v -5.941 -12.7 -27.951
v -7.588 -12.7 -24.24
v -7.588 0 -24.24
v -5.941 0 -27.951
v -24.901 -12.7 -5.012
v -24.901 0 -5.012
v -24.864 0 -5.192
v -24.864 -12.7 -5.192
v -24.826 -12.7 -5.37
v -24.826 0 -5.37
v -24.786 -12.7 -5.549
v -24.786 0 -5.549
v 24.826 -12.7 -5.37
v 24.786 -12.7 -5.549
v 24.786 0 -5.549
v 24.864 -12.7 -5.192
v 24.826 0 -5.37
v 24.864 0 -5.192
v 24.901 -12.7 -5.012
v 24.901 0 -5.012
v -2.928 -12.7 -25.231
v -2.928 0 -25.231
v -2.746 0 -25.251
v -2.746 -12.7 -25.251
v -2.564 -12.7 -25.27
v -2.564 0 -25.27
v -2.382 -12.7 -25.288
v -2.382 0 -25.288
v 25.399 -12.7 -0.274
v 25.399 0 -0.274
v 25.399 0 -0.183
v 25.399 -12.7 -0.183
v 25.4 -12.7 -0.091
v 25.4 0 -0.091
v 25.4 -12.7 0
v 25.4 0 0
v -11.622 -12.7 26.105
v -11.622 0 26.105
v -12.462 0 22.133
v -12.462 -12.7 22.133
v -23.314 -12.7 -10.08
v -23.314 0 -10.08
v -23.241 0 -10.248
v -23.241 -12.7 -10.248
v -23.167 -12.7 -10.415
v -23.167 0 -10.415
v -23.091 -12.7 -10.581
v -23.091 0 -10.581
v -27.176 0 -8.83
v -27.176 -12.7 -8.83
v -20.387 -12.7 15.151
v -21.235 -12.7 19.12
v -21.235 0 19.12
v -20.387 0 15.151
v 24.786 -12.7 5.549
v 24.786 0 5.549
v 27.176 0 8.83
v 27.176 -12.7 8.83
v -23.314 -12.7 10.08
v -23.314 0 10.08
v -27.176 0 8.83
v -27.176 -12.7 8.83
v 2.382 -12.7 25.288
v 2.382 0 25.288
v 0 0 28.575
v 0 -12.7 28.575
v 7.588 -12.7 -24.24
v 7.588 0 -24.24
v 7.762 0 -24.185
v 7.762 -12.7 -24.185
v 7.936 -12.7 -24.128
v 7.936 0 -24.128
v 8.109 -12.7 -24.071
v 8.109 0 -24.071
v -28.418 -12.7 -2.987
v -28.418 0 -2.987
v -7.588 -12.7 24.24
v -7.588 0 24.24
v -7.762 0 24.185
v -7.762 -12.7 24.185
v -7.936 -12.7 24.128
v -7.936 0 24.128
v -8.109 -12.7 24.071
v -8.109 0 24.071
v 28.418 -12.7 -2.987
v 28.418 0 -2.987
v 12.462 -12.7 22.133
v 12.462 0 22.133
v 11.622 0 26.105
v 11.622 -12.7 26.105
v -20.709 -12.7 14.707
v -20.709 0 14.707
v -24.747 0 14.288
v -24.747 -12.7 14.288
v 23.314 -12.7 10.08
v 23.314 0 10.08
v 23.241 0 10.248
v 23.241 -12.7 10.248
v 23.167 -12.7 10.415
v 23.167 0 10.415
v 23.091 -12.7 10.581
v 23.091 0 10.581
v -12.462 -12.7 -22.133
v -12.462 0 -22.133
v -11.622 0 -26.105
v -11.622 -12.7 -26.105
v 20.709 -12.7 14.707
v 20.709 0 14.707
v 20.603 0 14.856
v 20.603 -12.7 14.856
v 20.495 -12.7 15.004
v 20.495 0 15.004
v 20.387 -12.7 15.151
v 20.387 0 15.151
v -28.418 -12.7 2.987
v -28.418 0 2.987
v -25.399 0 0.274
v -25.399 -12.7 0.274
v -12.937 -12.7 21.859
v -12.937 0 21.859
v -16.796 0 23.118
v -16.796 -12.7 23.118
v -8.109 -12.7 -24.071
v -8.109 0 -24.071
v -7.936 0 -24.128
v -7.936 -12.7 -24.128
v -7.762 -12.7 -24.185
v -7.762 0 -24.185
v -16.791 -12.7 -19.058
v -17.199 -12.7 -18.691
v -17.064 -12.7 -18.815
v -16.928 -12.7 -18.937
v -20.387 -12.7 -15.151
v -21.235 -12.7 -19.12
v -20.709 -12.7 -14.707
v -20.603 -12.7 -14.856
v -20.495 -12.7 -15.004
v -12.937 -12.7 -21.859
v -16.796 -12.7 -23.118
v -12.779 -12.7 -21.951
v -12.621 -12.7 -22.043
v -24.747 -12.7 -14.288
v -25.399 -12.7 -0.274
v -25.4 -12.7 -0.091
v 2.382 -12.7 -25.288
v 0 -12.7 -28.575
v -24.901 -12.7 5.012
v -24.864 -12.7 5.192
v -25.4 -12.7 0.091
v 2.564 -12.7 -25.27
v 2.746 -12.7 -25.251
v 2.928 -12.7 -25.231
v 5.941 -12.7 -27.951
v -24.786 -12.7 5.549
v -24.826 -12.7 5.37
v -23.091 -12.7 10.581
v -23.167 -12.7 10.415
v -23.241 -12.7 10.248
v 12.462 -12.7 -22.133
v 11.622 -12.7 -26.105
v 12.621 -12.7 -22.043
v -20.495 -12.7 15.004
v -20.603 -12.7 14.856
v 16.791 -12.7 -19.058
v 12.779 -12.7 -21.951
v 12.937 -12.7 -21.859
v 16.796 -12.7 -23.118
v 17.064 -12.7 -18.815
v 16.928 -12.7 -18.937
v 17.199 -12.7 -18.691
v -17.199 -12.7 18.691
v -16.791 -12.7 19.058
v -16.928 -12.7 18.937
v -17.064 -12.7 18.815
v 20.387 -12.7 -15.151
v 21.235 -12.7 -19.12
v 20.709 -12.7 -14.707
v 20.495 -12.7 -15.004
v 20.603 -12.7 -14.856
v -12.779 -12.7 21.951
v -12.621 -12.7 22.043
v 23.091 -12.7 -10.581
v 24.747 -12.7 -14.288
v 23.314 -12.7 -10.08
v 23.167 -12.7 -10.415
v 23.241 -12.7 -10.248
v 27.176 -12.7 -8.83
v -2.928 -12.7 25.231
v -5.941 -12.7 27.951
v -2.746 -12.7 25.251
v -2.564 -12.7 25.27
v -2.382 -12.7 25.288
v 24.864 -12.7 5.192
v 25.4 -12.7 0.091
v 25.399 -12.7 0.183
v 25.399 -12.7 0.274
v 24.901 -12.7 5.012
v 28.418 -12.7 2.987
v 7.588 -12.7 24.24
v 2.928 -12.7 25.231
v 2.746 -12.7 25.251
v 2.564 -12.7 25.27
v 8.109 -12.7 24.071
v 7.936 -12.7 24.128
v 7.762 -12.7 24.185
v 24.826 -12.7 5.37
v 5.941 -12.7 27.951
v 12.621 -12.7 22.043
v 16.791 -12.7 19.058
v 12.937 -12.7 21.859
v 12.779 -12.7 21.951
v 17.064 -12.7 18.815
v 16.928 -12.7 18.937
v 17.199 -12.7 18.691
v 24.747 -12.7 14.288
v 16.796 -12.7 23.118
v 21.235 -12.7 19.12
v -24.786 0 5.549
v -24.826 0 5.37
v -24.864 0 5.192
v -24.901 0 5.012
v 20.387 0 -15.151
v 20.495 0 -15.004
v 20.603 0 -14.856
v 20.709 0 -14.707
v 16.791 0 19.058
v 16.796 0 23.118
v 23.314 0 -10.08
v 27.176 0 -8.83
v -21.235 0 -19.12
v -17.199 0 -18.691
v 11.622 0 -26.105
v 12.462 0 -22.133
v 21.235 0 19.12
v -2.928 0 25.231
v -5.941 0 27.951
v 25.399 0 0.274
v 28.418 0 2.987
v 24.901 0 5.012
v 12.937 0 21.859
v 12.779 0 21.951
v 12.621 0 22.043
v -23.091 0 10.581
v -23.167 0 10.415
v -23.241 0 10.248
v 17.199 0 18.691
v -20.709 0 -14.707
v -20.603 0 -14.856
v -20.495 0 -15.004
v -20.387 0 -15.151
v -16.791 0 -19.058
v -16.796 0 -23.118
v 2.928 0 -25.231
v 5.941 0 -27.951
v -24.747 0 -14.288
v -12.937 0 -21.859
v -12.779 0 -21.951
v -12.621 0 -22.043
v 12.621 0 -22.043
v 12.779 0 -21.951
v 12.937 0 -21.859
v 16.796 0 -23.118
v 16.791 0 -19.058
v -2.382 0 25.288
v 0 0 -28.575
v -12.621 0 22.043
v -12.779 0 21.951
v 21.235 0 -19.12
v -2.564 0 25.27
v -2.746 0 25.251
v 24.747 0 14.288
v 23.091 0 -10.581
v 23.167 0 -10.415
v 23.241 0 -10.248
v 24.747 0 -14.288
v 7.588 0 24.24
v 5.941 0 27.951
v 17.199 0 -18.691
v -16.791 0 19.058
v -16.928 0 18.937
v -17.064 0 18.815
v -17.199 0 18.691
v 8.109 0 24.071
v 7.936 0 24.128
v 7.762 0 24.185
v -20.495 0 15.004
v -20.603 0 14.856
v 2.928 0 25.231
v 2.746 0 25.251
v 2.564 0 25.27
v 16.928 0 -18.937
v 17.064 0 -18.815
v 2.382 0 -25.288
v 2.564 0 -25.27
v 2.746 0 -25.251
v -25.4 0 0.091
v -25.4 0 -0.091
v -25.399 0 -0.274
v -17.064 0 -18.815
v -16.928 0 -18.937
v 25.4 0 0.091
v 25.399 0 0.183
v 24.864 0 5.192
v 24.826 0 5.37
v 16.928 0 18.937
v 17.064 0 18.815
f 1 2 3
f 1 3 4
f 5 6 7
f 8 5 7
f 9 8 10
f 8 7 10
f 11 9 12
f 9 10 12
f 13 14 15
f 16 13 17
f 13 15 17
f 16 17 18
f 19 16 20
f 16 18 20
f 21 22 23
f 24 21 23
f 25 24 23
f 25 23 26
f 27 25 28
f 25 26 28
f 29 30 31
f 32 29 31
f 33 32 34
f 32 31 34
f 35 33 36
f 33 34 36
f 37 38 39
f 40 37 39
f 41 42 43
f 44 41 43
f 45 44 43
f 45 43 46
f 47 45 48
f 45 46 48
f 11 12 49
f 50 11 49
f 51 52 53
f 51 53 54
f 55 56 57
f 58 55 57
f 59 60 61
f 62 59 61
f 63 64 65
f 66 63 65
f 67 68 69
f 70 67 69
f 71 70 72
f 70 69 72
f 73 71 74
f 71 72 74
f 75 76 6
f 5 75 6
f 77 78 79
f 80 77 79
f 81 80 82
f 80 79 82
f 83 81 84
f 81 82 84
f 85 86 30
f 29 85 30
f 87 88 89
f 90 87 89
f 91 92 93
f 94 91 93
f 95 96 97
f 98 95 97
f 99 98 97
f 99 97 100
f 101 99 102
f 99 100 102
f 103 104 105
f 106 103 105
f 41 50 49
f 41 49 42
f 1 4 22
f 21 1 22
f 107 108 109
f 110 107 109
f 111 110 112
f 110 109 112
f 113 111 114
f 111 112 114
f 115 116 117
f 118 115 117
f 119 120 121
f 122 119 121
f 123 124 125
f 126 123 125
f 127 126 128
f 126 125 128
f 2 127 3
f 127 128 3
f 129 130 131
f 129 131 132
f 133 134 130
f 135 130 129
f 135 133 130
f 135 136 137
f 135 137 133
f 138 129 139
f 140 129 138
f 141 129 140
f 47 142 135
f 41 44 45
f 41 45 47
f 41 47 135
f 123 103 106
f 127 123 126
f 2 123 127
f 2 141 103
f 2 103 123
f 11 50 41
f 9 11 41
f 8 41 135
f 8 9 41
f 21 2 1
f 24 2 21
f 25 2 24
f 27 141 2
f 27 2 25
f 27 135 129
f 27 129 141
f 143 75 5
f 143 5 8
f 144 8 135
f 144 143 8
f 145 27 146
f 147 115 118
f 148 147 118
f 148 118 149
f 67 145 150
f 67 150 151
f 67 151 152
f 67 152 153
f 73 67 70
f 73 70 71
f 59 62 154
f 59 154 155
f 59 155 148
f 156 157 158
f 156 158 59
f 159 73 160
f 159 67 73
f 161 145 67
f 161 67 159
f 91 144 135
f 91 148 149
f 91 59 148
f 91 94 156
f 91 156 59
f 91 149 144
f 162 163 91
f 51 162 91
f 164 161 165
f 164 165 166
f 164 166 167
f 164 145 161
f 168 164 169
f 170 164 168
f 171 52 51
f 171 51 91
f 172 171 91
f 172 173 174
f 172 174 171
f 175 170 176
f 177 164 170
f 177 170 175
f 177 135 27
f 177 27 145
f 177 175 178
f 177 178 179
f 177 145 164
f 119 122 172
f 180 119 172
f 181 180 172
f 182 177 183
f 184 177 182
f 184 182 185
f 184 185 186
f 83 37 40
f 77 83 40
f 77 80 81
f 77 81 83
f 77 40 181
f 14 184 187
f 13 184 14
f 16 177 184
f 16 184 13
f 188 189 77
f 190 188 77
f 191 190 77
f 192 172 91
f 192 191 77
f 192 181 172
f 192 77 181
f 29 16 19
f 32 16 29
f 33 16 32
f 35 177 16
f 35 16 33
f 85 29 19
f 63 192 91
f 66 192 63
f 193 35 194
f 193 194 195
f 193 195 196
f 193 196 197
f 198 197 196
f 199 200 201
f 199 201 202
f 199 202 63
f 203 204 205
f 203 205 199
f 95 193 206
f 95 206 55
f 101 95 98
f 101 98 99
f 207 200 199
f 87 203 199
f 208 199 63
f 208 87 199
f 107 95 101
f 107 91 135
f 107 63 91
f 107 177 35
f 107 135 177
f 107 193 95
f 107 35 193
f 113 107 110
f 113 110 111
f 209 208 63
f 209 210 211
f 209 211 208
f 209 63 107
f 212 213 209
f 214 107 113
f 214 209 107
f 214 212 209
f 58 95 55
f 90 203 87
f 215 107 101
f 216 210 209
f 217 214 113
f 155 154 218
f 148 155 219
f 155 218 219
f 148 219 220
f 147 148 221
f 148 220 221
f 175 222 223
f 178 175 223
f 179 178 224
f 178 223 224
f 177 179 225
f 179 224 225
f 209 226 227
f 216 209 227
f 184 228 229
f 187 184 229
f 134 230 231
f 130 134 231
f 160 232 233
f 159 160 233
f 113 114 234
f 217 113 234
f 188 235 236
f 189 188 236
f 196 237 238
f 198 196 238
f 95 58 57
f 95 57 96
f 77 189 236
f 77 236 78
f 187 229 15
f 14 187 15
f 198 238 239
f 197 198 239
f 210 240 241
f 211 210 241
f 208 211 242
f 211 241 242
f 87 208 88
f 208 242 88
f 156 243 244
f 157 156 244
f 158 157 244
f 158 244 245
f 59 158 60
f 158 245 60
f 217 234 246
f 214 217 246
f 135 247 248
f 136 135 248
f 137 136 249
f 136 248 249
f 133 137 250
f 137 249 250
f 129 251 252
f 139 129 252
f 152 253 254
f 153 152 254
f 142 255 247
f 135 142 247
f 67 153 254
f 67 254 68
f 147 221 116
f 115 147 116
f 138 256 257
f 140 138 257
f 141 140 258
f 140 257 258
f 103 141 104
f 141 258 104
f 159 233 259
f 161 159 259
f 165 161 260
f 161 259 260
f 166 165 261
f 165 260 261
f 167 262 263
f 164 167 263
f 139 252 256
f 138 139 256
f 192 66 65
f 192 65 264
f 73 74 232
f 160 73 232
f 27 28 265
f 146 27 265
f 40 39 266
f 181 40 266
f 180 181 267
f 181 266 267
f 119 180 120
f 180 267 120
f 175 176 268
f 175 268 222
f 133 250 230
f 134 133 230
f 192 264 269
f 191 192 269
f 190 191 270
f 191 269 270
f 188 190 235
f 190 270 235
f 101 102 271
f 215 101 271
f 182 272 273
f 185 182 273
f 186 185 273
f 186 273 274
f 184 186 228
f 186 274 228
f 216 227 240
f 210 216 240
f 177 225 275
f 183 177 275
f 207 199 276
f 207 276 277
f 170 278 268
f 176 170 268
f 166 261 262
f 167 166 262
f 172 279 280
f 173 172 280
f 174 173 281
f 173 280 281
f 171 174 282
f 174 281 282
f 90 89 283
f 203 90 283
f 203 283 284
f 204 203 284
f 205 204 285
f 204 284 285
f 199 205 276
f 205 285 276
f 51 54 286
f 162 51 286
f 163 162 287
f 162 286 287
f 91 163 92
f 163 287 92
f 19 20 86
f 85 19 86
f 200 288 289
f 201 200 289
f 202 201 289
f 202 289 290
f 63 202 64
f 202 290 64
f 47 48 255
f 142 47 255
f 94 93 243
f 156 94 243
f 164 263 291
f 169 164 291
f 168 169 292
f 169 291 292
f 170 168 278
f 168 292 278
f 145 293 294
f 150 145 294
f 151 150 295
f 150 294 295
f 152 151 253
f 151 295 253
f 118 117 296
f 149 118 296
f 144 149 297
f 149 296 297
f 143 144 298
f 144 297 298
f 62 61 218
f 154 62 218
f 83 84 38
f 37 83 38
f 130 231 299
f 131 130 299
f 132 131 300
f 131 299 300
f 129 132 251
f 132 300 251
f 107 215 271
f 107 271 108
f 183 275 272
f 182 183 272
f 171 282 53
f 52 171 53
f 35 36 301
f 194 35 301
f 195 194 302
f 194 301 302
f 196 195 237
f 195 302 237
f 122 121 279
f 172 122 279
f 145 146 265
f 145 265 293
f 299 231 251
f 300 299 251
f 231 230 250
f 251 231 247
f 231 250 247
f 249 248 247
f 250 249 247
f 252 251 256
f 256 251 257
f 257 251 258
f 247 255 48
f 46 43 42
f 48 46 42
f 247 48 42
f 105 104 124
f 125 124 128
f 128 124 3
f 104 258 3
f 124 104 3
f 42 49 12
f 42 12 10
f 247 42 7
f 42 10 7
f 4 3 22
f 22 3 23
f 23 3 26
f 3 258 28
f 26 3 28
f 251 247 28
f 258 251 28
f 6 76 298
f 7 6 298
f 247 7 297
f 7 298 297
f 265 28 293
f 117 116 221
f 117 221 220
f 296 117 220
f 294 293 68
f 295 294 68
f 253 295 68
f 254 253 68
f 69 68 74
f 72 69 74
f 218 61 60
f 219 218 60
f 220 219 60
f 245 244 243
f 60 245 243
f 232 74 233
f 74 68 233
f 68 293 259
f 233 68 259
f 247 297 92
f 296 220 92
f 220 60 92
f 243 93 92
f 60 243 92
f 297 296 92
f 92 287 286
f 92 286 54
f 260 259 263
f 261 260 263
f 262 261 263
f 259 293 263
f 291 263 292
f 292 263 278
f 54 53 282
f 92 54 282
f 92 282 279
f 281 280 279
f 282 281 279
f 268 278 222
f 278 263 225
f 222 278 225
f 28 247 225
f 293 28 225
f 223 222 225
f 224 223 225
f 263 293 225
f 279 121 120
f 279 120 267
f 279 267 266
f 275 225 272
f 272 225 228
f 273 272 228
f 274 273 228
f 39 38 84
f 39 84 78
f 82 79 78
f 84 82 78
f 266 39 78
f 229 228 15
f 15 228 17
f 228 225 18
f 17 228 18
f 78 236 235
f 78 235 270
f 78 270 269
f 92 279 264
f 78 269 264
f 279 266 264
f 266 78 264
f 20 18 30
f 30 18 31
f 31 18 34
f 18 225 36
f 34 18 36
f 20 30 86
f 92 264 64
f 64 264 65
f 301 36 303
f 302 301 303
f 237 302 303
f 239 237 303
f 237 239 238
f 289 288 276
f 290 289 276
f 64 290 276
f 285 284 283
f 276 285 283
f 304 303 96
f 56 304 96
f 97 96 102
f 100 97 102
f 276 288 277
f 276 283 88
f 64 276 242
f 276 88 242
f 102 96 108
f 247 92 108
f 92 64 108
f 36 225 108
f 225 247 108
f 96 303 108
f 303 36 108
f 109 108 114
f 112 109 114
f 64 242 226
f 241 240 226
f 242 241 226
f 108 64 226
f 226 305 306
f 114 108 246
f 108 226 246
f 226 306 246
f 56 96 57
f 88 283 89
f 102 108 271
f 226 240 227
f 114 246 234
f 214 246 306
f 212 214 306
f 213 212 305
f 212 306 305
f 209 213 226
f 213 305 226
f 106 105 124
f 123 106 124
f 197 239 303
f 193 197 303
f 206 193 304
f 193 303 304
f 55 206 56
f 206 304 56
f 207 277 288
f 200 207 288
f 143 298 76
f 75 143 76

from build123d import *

# Parameters (mm, degrees)
F1_DEPTH = 12.7


with BuildPart() as f1:
    # F0 (on Front) → F1 (new body)
    with BuildSketch(Plane.XZ):
        with BuildLine():
            ThreePointArc((25.39852, -0.274206), (25.39963, -0.137105), (25.4, 0))
            ThreePointArc((25.4, 0), (25.39963, 0.137105), (25.39852, 0.274206))
            ThreePointArc((25.39852, 0.274206), (25.260856, 2.655023), (24.900512, 5.012436))
            ThreePointArc((24.900512, 5.012436), (24.844949, 5.280957), (24.786491, 5.548863))
            ThreePointArc((24.786491, 5.548863), (24.156836, 7.849032), (23.314232, 10.080009))
            ThreePointArc((23.314232, 10.080009), (23.204055, 10.331111), (23.091173, 10.581008))
            ThreePointArc((23.091173, 10.581008), (21.997045, 12.7), (20.709008, 14.707038))
            ThreePointArc((20.709008, 14.707038), (20.549032, 14.929745), (20.38666, 15.150713))
            ThreePointArc((20.38666, 15.150713), (18.875879, 16.995917), (17.198702, 18.691299))
            ThreePointArc((17.198702, 18.691299), (16.995917, 18.875879), (16.791152, 19.058258))
            ThreePointArc((16.791152, 19.058258), (14.929745, 20.549032), (12.936729, 21.858661))
            ThreePointArc((12.936729, 21.858661), (12.7, 21.997045), (12.461791, 22.132866))
            ThreePointArc((12.461791, 22.132866), (10.331111, 23.204055), (8.109359, 24.070694))
            ThreePointArc((8.109359, 24.070694), (7.849032, 24.156836), (7.587789, 24.240162))
            ThreePointArc((7.587789, 24.240162), (5.280957, 24.844949), (2.927572, 25.230722))
            ThreePointArc((2.927572, 25.230722), (2.655023, 25.260856), (2.382165, 25.288046))
            ThreePointArc((2.382165, 25.288046), (0, 25.4), (-2.382165, 25.288046))
            ThreePointArc((-2.382165, 25.288046), (-2.655023, 25.260856), (-2.927572, 25.230722))
            ThreePointArc((-2.927572, 25.230722), (-5.280957, 24.844949), (-7.587789, 24.240162))
            ThreePointArc((-7.587789, 24.240162), (-7.849032, 24.156836), (-8.109359, 24.070694))
            ThreePointArc((-8.109359, 24.070694), (-10.331111, 23.204055), (-12.461791, 22.132866))
            ThreePointArc((-12.461791, 22.132866), (-12.7, 21.997045), (-12.936729, 21.858661))
            ThreePointArc((-12.936729, 21.858661), (-14.929745, 20.549032), (-16.791152, 19.058258))
            ThreePointArc((-16.791152, 19.058258), (-16.995917, 18.875879), (-17.198702, 18.691299))
            ThreePointArc((-17.198702, 18.691299), (-18.875879, 16.995917), (-20.38666, 15.150713))
            ThreePointArc((-20.38666, 15.150713), (-20.549032, 14.929745), (-20.709008, 14.707038))
            ThreePointArc((-20.709008, 14.707038), (-21.997045, 12.7), (-23.091173, 10.581008))
            ThreePointArc((-23.091173, 10.581008), (-23.204055, 10.331111), (-23.314232, 10.080009))
            ThreePointArc((-23.314232, 10.080009), (-24.156836, 7.849032), (-24.786491, 5.548863))
            ThreePointArc((-24.786491, 5.548863), (-24.844949, 5.280957), (-24.900512, 5.012436))
            ThreePointArc((-24.900512, 5.012436), (-25.260856, 2.655023), (-25.39852, 0.274206))
            ThreePointArc((-25.39852, 0.274206), (-25.4, 0), (-25.39852, -0.274206))
            ThreePointArc((-25.39852, -0.274206), (-25.260856, -2.655023), (-24.900512, -5.012436))
            ThreePointArc((-24.900512, -5.012436), (-24.844949, -5.280957), (-24.786491, -5.548863))
            ThreePointArc((-24.786491, -5.548863), (-24.156836, -7.849032), (-23.314232, -10.080009))
            ThreePointArc((-23.314232, -10.080009), (-23.204055, -10.331111), (-23.091173, -10.581008))
            ThreePointArc((-23.091173, -10.581008), (-21.997045, -12.7), (-20.709008, -14.707038))
            ThreePointArc((-20.709008, -14.707038), (-20.549032, -14.929745), (-20.38666, -15.150713))
            ThreePointArc((-20.38666, -15.150713), (-18.875879, -16.995917), (-17.198702, -18.691299))
            ThreePointArc((-17.198702, -18.691299), (-16.995917, -18.875879), (-16.791152, -19.058258))
            ThreePointArc((-16.791152, -19.058258), (-14.929745, -20.549032), (-12.936729, -21.858661))
            ThreePointArc((-12.936729, -21.858661), (-12.7, -21.997045), (-12.461791, -22.132866))
            ThreePointArc((-12.461791, -22.132866), (-10.331111, -23.204055), (-8.109359, -24.070694))
            ThreePointArc((-8.109359, -24.070694), (-7.849032, -24.156836), (-7.587789, -24.240162))
            ThreePointArc((-7.587789, -24.240162), (-5.280957, -24.844949), (-2.927572, -25.230722))
            ThreePointArc((-2.927572, -25.230722), (-2.655023, -25.260856), (-2.382165, -25.288046))
            ThreePointArc((-2.382165, -25.288046), (0, -25.4), (2.382165, -25.288046))
            ThreePointArc((2.382165, -25.288046), (2.655023, -25.260856), (2.927572, -25.230722))
            ThreePointArc((2.927572, -25.230722), (5.280957, -24.844949), (7.587789, -24.240162))
            ThreePointArc((7.587789, -24.240162), (7.849032, -24.156836), (8.109359, -24.070694))
            ThreePointArc((8.109359, -24.070694), (10.331111, -23.204055), (12.461791, -22.132866))
            ThreePointArc((12.461791, -22.132866), (12.7, -21.997045), (12.936729, -21.858661))
            ThreePointArc((12.936729, -21.858661), (14.929745, -20.549032), (16.791152, -19.058258))
            ThreePointArc((16.791152, -19.058258), (16.995917, -18.875879), (17.198702, -18.691299))
            ThreePointArc((17.198702, -18.691299), (18.875879, -16.995917), (20.38666, -15.150713))
            ThreePointArc((20.38666, -15.150713), (20.549032, -14.929745), (20.709008, -14.707038))
            ThreePointArc((20.709008, -14.707038), (21.997045, -12.7), (23.091173, -10.581008))
            ThreePointArc((23.091173, -10.581008), (23.204055, -10.331111), (23.314232, -10.080009))
            ThreePointArc((23.314232, -10.080009), (24.156836, -7.849032), (24.786491, -5.548863))
            ThreePointArc((24.786491, -5.548863), (24.844949, -5.280957), (24.900512, -5.012436))
            ThreePointArc((24.900512, -5.012436), (25.260856, -2.655023), (25.39852, -0.274206))
        make_face()
        with BuildLine():
            ThreePointArc((-23.091173, 10.581008), (-21.997045, 12.7), (-20.709008, 14.707038))
            Line((-20.709008, 14.707038), (-24.746676, 14.2875))
            Line((-24.746676, 14.2875), (-23.091173, 10.581008))
        make_face()
        with BuildLine():
            ThreePointArc((-20.38666, 15.150713), (-18.875879, 16.995917), (-17.198702, 18.691299))
            Line((-17.198702, 18.691299), (-21.235363, 19.120407))
            Line((-21.235363, 19.120407), (-20.38666, 15.150713))
        make_face()
        with BuildLine():
            ThreePointArc((-16.791152, 19.058258), (-14.929745, 20.549032), (-12.936729, 21.858661))
            Line((-12.936729, 21.858661), (-16.795964, 23.117661))
            Line((-16.795964, 23.117661), (-16.791152, 19.058258))
        make_face()
        with BuildLine():
            ThreePointArc((-12.461791, 22.132866), (-10.331111, 23.204055), (-8.109359, 24.070694))
            Line((-8.109359, 24.070694), (-11.6225, 26.104561))
            Line((-11.6225, 26.104561), (-12.461791, 22.132866))
        make_face()
        with BuildLine():
            ThreePointArc((-7.587789, 24.240162), (-5.280957, 24.844949), (-2.927572, 25.230722))
            Line((-2.927572, 25.230722), (-5.941077, 27.950568))
            Line((-5.941077, 27.950568), (-7.587789, 24.240162))
        make_face()
        with BuildLine():
            ThreePointArc((-2.382165, 25.288046), (0, 25.4), (2.382165, 25.288046))
            Line((2.382165, 25.288046), (0, 28.575))
            Line((0, 28.575), (-2.382165, 25.288046))
        make_face()
        with BuildLine():
            ThreePointArc((2.927572, 25.230722), (5.280957, 24.844949), (7.587789, 24.240162))
            Line((7.587789, 24.240162), (5.941077, 27.950568))
            Line((5.941077, 27.950568), (2.927572, 25.230722))
        make_face()
        with BuildLine():
            ThreePointArc((8.109359, 24.070694), (10.331111, 23.204055), (12.461791, 22.132866))
            Line((12.461791, 22.132866), (11.6225, 26.104561))
            Line((11.6225, 26.104561), (8.109359, 24.070694))
        make_face()
        with BuildLine():
            ThreePointArc((12.936729, 21.858661), (14.929745, 20.549032), (16.791152, 19.058258))
            Line((16.791152, 19.058258), (16.795964, 23.117661))
            Line((16.795964, 23.117661), (12.936729, 21.858661))
        make_face()
        with BuildLine():
            ThreePointArc((17.198702, 18.691299), (18.875879, 16.995917), (20.38666, 15.150713))
            Line((20.38666, 15.150713), (21.235363, 19.120407))
            Line((21.235363, 19.120407), (17.198702, 18.691299))
        make_face()
        with BuildLine():
            ThreePointArc((20.709008, 14.707038), (21.997045, 12.7), (23.091173, 10.581008))
            Line((23.091173, 10.581008), (24.746676, 14.2875))
            Line((24.746676, 14.2875), (20.709008, 14.707038))
        make_face()
        with BuildLine():
            ThreePointArc((23.314232, 10.080009), (24.156836, 7.849032), (24.786491, 5.548863))
            Line((24.786491, 5.548863), (27.17644, 8.830161))
            Line((27.17644, 8.830161), (23.314232, 10.080009))
        make_face()
        with BuildLine():
            ThreePointArc((24.900512, 5.012436), (25.260856, 2.655023), (25.39852, 0.274206))
            Line((25.39852, 0.274206), (28.418463, 2.986901))
            Line((28.418463, 2.986901), (24.900512, 5.012436))
        make_face()
        with BuildLine():
            Line((28.418463, -2.986901), (25.39852, -0.274206))
            ThreePointArc((25.39852, -0.274206), (25.260856, -2.655023), (24.900512, -5.012436))
            Line((24.900512, -5.012436), (28.418463, -2.986901))
        make_face()
        with BuildLine():
            Line((27.17644, -8.830161), (24.786491, -5.548863))
            ThreePointArc((24.786491, -5.548863), (24.156836, -7.849032), (23.314232, -10.080009))
            Line((23.314232, -10.080009), (27.17644, -8.830161))
        make_face()
        with BuildLine():
            Line((24.746676, -14.2875), (23.091173, -10.581008))
            ThreePointArc((23.091173, -10.581008), (21.997045, -12.7), (20.709008, -14.707038))
            Line((20.709008, -14.707038), (24.746676, -14.2875))
        make_face()
        with BuildLine():
            Line((21.235363, -19.120407), (20.38666, -15.150713))
            ThreePointArc((20.38666, -15.150713), (18.875879, -16.995917), (17.198702, -18.691299))
            Line((17.198702, -18.691299), (21.235363, -19.120407))
        make_face()
        with BuildLine():
            Line((16.795964, -23.117661), (16.791152, -19.058258))
            ThreePointArc((16.791152, -19.058258), (14.929745, -20.549032), (12.936729, -21.858661))
            Line((12.936729, -21.858661), (16.795964, -23.117661))
        make_face()
        with BuildLine():
            Line((11.6225, -26.104561), (12.461791, -22.132866))
            ThreePointArc((12.461791, -22.132866), (10.331111, -23.204055), (8.109359, -24.070694))
            Line((8.109359, -24.070694), (11.6225, -26.104561))
        make_face()
        with BuildLine():
            Line((5.941077, -27.950568), (7.587789, -24.240162))
            ThreePointArc((7.587789, -24.240162), (5.280957, -24.844949), (2.927572, -25.230722))
            Line((2.927572, -25.230722), (5.941077, -27.950568))
        make_face()
        with BuildLine():
            Line((0, -28.575), (2.382165, -25.288046))
            ThreePointArc((2.382165, -25.288046), (0, -25.4), (-2.382165, -25.288046))
            Line((-2.382165, -25.288046), (0, -28.575))
        make_face()
        with BuildLine():
            Line((-5.941077, -27.950568), (-2.927572, -25.230722))
            ThreePointArc((-2.927572, -25.230722), (-5.280957, -24.844949), (-7.587789, -24.240162))
            Line((-7.587789, -24.240162), (-5.941077, -27.950568))
        make_face()
        with BuildLine():
            Line((-11.6225, -26.104561), (-8.109359, -24.070694))
            ThreePointArc((-8.109359, -24.070694), (-10.331111, -23.204055), (-12.461791, -22.132866))
            Line((-12.461791, -22.132866), (-11.6225, -26.104561))
        make_face()
        with BuildLine():
            Line((-16.795964, -23.117661), (-12.936729, -21.858661))
            ThreePointArc((-12.936729, -21.858661), (-14.929745, -20.549032), (-16.791152, -19.058258))
            Line((-16.791152, -19.058258), (-16.795964, -23.117661))
        make_face()
        with BuildLine():
            Line((-21.235363, -19.120407), (-17.198702, -18.691299))
            ThreePointArc((-17.198702, -18.691299), (-18.875879, -16.995917), (-20.38666, -15.150713))
            Line((-20.38666, -15.150713), (-21.235363, -19.120407))
        make_face()
        with BuildLine():
            Line((-24.746676, -14.2875), (-20.709008, -14.707038))
            ThreePointArc((-20.709008, -14.707038), (-21.997045, -12.7), (-23.091173, -10.581008))
            Line((-23.091173, -10.581008), (-24.746676, -14.2875))
        make_face()
        with BuildLine():
            Line((-27.17644, -8.830161), (-23.314232, -10.080009))
            ThreePointArc((-23.314232, -10.080009), (-24.156836, -7.849032), (-24.786491, -5.548863))
            Line((-24.786491, -5.548863), (-27.17644, -8.830161))
        make_face()
        with BuildLine():
            Line((-28.418463, -2.986901), (-24.900512, -5.012436))
            ThreePointArc((-24.900512, -5.012436), (-25.260856, -2.655023), (-25.39852, -0.274206))
            Line((-25.39852, -0.274206), (-28.418463, -2.986901))
        make_face()
        with BuildLine():
            ThreePointArc((-25.39852, 0.274206), (-25.260856, 2.655023), (-24.900512, 5.012436))
            Line((-24.900512, 5.012436), (-28.418463, 2.986901))
            Line((-28.418463, 2.986901), (-25.39852, 0.274206))
        make_face()
        with BuildLine():
            ThreePointArc((-24.786491, 5.548863), (-24.156836, 7.849032), (-23.314232, 10.080009))
            Line((-23.314232, 10.080009), (-27.17644, 8.830161))
            Line((-27.17644, 8.830161), (-24.786491, 5.548863))
        make_face()
    extrude(amount=F1_DEPTH)


solid = f1.part
